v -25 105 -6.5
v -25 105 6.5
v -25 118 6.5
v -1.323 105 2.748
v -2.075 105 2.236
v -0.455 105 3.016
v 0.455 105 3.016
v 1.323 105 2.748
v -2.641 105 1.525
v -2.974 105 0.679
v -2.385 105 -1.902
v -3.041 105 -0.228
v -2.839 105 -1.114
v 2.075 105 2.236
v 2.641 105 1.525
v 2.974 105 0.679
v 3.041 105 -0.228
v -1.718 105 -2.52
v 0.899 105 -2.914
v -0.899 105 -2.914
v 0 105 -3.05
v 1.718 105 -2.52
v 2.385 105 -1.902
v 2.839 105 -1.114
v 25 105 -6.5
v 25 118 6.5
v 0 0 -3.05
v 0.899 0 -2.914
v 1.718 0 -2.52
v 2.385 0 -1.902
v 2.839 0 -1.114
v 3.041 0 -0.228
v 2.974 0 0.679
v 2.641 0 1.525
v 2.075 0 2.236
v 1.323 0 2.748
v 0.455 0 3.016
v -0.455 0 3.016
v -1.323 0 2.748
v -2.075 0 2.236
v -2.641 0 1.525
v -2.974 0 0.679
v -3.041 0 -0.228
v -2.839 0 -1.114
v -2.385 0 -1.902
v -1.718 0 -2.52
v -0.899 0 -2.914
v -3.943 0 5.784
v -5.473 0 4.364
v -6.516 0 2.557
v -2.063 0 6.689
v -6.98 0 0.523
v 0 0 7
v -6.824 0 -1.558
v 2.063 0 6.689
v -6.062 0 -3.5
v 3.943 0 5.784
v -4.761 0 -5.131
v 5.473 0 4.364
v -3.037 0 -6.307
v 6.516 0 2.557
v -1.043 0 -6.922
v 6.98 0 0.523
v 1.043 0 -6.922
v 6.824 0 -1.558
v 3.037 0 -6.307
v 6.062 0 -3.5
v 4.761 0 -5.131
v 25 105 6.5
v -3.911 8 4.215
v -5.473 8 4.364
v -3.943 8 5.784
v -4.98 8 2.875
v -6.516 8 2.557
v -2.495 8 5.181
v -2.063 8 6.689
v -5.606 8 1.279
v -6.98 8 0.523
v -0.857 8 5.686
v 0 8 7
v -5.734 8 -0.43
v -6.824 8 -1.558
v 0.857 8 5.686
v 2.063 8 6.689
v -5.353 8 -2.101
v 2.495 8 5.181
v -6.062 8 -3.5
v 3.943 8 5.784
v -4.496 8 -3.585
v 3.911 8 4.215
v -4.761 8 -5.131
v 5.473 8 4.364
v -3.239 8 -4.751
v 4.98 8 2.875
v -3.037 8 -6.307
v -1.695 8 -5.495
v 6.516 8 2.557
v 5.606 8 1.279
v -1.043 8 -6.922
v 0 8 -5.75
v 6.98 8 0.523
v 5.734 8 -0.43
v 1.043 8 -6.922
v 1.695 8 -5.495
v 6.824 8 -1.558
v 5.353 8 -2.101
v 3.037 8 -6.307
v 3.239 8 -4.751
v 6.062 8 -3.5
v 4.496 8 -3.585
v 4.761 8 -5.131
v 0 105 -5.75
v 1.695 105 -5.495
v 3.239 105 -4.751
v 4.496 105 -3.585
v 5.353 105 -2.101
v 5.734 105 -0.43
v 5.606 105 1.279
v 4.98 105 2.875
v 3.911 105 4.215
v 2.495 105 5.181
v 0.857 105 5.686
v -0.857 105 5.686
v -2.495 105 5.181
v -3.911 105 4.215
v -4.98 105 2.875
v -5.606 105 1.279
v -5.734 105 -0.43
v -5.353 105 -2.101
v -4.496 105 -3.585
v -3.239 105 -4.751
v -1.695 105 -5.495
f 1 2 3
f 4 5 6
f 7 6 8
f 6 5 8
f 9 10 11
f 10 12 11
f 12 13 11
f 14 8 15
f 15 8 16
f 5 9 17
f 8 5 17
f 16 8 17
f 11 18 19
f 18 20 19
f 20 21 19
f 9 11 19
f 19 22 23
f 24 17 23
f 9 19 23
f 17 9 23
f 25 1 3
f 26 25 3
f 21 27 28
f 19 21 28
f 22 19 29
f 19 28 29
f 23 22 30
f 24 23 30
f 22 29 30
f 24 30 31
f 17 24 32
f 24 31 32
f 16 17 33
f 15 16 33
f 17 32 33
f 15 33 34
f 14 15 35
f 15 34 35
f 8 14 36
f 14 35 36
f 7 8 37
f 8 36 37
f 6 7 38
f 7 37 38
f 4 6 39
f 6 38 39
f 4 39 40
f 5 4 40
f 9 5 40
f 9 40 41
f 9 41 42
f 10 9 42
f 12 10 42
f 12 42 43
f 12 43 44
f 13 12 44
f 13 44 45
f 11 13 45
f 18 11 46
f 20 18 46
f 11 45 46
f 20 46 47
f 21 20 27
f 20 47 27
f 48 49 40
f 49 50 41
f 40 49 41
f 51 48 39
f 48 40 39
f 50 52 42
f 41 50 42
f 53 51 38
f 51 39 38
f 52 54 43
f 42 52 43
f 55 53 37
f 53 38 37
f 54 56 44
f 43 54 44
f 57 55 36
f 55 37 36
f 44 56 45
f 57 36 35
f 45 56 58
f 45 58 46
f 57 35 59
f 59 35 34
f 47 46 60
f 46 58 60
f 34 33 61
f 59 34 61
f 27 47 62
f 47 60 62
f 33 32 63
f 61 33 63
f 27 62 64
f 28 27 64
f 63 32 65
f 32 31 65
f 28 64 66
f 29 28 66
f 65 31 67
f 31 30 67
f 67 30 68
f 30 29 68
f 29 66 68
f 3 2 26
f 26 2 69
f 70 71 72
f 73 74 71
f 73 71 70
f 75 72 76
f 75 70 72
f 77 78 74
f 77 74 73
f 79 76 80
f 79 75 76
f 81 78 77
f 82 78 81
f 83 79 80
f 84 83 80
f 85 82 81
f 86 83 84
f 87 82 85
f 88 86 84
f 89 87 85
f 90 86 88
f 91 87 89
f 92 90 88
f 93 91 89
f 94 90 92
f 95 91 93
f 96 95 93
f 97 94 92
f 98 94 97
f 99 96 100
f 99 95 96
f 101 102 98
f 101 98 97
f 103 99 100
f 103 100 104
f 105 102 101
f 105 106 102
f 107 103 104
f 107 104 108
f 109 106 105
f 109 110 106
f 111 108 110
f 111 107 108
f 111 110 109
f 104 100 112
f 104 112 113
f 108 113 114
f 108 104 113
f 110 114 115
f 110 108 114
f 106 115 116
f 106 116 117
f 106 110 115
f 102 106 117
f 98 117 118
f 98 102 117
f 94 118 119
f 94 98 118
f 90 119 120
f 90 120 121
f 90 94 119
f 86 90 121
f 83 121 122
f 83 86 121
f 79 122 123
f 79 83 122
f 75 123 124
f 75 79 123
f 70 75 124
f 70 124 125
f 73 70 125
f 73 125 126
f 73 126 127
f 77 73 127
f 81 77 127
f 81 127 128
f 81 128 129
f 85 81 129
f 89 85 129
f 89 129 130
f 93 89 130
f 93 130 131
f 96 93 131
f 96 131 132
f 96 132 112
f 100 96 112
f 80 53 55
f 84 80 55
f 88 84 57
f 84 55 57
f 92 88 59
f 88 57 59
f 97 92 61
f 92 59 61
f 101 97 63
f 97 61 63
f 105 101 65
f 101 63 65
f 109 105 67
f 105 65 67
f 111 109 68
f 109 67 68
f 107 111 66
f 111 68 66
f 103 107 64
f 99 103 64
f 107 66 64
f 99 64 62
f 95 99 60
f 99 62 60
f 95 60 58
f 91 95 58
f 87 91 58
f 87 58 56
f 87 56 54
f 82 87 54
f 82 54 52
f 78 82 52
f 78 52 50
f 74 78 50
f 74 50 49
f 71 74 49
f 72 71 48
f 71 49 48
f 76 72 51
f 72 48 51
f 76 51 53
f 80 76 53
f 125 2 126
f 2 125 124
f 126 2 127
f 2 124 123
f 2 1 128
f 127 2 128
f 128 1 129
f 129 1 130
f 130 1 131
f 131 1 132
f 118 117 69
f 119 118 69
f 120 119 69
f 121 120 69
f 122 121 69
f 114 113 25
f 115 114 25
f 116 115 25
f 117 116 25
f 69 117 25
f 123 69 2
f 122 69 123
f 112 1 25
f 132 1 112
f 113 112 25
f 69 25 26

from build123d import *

# Parameters (mm, degrees)
SKETCH1_R            = 7
SKETCH1_R_2          = 4
BOSS_EXTRUDE1_DEPTH  = 8
SKETCH1_3_R          = 4.75
SKETCH1_3_R_2        = 4
BOSS_EXTRUDE2_DEPTH  = 80
SKETCH3_R            = 5.75
SKETCH3_R_2          = 3.05
BOSS_EXTRUDE3_DEPTH  = 105
SKETCH8_W            = 50
SKETCH8_H            = 13
BOSS_EXTRUDE8_DEPTH  = 4
SKETCH9_W            = 50
SKETCH9_H            = 6.245985434
BOSS_EXTRUDE9_DEPTH  = 9
BOSS_EXTRUDE10_DEPTH = 50
SKETCH11_W           = 50
SKETCH11_H           = 12.98265639
BOSS_EXTRUDE11_DEPTH = 10
CUT_EXTRUDE1_DEPTH   = 100
SKETCH13_W           = 50
SKETCH13_H           = 13
BOSS_EXTRUDE12_DEPTH = 13
CUT_EXTRUDE2_DEPTH   = 50
CUT_EXTRUDE3_DEPTH   = 50


with BuildPart() as part:
    # Sketch1 → Boss-Extrude1 (new body)
    with BuildSketch(Plane(origin=(0, 0, 0), x_dir=(1, 0, 0), z_dir=(0, 1, 0))):
        Circle(SKETCH1_R)
        Circle(SKETCH1_R_2, mode=Mode.SUBTRACT)
    extrude(amount=BOSS_EXTRUDE1_DEPTH)

    # Sketch1<3> → Boss-Extrude2 (add)
    with BuildSketch(Plane(origin=(0, 0, 0), x_dir=(1, 0, 0), z_dir=(0, 1, 0))):
        Circle(SKETCH1_3_R)
        Circle(SKETCH1_3_R_2, mode=Mode.SUBTRACT)
    extrude(amount=BOSS_EXTRUDE2_DEPTH)

    # Sketch3 → Boss-Extrude3 (add)
    with BuildSketch(Plane.XZ):
        Circle(SKETCH3_R)
        Circle(SKETCH3_R_2, mode=Mode.SUBTRACT)
    extrude(amount=-BOSS_EXTRUDE3_DEPTH)

    # Sketch8 → Boss-Extrude8 (add)
    with BuildSketch(Plane(origin=(0, 105, 0), x_dir=(1, 0, 0), z_dir=(0, 1, 0))):
        Rectangle(SKETCH8_W, SKETCH8_H)
    extrude(amount=BOSS_EXTRUDE8_DEPTH)

    # Sketch9 → Boss-Extrude9 (add)
    with BuildSketch(Plane(origin=(0, 109, 0), x_dir=(1, 0, 0), z_dir=(0, 1, 0))):
        with Locations((0, -3.377007283)):
            Rectangle(SKETCH9_W, SKETCH9_H)
    extrude(amount=BOSS_EXTRUDE9_DEPTH)

    # Sketch10 → Boss-Extrude10 (add)
    with BuildSketch(Plane.ZY.offset(25)):
        with BuildLine():
            Line((0.254014566, 118), (0.254014566, 109))
            Line((0.254014566, 109), (-6.5, 109))
            ThreePointArc((-6.5, 109), (-4.986953748, 114.898802217), (0.254014566, 118))
        make_face()
    extrude(amount=-BOSS_EXTRUDE10_DEPTH)

    # Sketch11 → Boss-Extrude11 (add)
    with BuildSketch(Plane(origin=(0, 118, 0), x_dir=(1, 0, 0), z_dir=(0, 1, 0))):
        Rectangle(SKETCH11_W, SKETCH11_H)
    extrude(amount=-BOSS_EXTRUDE11_DEPTH)

    # Sketch12 → Cut-Extrude1 (cut)
    with BuildSketch(Plane(origin=(0, 0, -6.491328195), x_dir=(-1, 0, 0), z_dir=(0, 0, -1))):
        with BuildLine():
            Line((-25, 118), (25, 118))
            ThreePointArc((25, 118), (0, 116.124221553), (-25, 118))
        make_face()
    extrude(amount=-CUT_EXTRUDE1_DEPTH, mode=Mode.SUBTRACT)

    # Sketch13 → Boss-Extrude12 (add)
    with BuildSketch(Plane.XZ.offset(-105)):
        Rectangle(SKETCH13_W, SKETCH13_H)
    extrude(amount=-BOSS_EXTRUDE12_DEPTH)

    # Sketch14 → Cut-Extrude2 (cut)
    with BuildSketch(Plane.ZY.offset(25)):
        Polygon((-6.5, 105), (6.5, 118), (-6.5, 118), (-6.5, 107), align=None)
    extrude(amount=-CUT_EXTRUDE2_DEPTH, mode=Mode.SUBTRACT)


with BuildPart() as cut_extrude2_piece_1:
    # of the separate pieces the step leaves, piece 1, a body of its own (cut_extrude2_pieces)
    add(part.part.solids().sort_by_distance((-25, 105, -6.5))[0])


with BuildPart() as cut_extrude2_piece_2:
    # of the separate pieces the step leaves, piece 2, a body of its own (cut_extrude2_pieces)
    add(part.part.solids().sort_by_distance((-25, 109, -6.5))[0])

    # Sketch15 → Cut-Extrude3 (cut)
    with BuildSketch(Plane.ZY.offset(25)):
        with BuildLine():
            Line((6.5, 118), (-6.5, 105))
            Line((-6.5, 105), (-15.046764463, 116.293960334))
            Line((-15.046764463, 116.293960334), (5.81150646, 117.953140975))
            ThreePointArc((5.81150646, 117.953140975), (6.155619412, 117.978536655), (6.5, 118))
        make_face()
    extrude(amount=-CUT_EXTRUDE3_DEPTH, mode=Mode.SUBTRACT)


solid = cut_extrude2_piece_1.part
